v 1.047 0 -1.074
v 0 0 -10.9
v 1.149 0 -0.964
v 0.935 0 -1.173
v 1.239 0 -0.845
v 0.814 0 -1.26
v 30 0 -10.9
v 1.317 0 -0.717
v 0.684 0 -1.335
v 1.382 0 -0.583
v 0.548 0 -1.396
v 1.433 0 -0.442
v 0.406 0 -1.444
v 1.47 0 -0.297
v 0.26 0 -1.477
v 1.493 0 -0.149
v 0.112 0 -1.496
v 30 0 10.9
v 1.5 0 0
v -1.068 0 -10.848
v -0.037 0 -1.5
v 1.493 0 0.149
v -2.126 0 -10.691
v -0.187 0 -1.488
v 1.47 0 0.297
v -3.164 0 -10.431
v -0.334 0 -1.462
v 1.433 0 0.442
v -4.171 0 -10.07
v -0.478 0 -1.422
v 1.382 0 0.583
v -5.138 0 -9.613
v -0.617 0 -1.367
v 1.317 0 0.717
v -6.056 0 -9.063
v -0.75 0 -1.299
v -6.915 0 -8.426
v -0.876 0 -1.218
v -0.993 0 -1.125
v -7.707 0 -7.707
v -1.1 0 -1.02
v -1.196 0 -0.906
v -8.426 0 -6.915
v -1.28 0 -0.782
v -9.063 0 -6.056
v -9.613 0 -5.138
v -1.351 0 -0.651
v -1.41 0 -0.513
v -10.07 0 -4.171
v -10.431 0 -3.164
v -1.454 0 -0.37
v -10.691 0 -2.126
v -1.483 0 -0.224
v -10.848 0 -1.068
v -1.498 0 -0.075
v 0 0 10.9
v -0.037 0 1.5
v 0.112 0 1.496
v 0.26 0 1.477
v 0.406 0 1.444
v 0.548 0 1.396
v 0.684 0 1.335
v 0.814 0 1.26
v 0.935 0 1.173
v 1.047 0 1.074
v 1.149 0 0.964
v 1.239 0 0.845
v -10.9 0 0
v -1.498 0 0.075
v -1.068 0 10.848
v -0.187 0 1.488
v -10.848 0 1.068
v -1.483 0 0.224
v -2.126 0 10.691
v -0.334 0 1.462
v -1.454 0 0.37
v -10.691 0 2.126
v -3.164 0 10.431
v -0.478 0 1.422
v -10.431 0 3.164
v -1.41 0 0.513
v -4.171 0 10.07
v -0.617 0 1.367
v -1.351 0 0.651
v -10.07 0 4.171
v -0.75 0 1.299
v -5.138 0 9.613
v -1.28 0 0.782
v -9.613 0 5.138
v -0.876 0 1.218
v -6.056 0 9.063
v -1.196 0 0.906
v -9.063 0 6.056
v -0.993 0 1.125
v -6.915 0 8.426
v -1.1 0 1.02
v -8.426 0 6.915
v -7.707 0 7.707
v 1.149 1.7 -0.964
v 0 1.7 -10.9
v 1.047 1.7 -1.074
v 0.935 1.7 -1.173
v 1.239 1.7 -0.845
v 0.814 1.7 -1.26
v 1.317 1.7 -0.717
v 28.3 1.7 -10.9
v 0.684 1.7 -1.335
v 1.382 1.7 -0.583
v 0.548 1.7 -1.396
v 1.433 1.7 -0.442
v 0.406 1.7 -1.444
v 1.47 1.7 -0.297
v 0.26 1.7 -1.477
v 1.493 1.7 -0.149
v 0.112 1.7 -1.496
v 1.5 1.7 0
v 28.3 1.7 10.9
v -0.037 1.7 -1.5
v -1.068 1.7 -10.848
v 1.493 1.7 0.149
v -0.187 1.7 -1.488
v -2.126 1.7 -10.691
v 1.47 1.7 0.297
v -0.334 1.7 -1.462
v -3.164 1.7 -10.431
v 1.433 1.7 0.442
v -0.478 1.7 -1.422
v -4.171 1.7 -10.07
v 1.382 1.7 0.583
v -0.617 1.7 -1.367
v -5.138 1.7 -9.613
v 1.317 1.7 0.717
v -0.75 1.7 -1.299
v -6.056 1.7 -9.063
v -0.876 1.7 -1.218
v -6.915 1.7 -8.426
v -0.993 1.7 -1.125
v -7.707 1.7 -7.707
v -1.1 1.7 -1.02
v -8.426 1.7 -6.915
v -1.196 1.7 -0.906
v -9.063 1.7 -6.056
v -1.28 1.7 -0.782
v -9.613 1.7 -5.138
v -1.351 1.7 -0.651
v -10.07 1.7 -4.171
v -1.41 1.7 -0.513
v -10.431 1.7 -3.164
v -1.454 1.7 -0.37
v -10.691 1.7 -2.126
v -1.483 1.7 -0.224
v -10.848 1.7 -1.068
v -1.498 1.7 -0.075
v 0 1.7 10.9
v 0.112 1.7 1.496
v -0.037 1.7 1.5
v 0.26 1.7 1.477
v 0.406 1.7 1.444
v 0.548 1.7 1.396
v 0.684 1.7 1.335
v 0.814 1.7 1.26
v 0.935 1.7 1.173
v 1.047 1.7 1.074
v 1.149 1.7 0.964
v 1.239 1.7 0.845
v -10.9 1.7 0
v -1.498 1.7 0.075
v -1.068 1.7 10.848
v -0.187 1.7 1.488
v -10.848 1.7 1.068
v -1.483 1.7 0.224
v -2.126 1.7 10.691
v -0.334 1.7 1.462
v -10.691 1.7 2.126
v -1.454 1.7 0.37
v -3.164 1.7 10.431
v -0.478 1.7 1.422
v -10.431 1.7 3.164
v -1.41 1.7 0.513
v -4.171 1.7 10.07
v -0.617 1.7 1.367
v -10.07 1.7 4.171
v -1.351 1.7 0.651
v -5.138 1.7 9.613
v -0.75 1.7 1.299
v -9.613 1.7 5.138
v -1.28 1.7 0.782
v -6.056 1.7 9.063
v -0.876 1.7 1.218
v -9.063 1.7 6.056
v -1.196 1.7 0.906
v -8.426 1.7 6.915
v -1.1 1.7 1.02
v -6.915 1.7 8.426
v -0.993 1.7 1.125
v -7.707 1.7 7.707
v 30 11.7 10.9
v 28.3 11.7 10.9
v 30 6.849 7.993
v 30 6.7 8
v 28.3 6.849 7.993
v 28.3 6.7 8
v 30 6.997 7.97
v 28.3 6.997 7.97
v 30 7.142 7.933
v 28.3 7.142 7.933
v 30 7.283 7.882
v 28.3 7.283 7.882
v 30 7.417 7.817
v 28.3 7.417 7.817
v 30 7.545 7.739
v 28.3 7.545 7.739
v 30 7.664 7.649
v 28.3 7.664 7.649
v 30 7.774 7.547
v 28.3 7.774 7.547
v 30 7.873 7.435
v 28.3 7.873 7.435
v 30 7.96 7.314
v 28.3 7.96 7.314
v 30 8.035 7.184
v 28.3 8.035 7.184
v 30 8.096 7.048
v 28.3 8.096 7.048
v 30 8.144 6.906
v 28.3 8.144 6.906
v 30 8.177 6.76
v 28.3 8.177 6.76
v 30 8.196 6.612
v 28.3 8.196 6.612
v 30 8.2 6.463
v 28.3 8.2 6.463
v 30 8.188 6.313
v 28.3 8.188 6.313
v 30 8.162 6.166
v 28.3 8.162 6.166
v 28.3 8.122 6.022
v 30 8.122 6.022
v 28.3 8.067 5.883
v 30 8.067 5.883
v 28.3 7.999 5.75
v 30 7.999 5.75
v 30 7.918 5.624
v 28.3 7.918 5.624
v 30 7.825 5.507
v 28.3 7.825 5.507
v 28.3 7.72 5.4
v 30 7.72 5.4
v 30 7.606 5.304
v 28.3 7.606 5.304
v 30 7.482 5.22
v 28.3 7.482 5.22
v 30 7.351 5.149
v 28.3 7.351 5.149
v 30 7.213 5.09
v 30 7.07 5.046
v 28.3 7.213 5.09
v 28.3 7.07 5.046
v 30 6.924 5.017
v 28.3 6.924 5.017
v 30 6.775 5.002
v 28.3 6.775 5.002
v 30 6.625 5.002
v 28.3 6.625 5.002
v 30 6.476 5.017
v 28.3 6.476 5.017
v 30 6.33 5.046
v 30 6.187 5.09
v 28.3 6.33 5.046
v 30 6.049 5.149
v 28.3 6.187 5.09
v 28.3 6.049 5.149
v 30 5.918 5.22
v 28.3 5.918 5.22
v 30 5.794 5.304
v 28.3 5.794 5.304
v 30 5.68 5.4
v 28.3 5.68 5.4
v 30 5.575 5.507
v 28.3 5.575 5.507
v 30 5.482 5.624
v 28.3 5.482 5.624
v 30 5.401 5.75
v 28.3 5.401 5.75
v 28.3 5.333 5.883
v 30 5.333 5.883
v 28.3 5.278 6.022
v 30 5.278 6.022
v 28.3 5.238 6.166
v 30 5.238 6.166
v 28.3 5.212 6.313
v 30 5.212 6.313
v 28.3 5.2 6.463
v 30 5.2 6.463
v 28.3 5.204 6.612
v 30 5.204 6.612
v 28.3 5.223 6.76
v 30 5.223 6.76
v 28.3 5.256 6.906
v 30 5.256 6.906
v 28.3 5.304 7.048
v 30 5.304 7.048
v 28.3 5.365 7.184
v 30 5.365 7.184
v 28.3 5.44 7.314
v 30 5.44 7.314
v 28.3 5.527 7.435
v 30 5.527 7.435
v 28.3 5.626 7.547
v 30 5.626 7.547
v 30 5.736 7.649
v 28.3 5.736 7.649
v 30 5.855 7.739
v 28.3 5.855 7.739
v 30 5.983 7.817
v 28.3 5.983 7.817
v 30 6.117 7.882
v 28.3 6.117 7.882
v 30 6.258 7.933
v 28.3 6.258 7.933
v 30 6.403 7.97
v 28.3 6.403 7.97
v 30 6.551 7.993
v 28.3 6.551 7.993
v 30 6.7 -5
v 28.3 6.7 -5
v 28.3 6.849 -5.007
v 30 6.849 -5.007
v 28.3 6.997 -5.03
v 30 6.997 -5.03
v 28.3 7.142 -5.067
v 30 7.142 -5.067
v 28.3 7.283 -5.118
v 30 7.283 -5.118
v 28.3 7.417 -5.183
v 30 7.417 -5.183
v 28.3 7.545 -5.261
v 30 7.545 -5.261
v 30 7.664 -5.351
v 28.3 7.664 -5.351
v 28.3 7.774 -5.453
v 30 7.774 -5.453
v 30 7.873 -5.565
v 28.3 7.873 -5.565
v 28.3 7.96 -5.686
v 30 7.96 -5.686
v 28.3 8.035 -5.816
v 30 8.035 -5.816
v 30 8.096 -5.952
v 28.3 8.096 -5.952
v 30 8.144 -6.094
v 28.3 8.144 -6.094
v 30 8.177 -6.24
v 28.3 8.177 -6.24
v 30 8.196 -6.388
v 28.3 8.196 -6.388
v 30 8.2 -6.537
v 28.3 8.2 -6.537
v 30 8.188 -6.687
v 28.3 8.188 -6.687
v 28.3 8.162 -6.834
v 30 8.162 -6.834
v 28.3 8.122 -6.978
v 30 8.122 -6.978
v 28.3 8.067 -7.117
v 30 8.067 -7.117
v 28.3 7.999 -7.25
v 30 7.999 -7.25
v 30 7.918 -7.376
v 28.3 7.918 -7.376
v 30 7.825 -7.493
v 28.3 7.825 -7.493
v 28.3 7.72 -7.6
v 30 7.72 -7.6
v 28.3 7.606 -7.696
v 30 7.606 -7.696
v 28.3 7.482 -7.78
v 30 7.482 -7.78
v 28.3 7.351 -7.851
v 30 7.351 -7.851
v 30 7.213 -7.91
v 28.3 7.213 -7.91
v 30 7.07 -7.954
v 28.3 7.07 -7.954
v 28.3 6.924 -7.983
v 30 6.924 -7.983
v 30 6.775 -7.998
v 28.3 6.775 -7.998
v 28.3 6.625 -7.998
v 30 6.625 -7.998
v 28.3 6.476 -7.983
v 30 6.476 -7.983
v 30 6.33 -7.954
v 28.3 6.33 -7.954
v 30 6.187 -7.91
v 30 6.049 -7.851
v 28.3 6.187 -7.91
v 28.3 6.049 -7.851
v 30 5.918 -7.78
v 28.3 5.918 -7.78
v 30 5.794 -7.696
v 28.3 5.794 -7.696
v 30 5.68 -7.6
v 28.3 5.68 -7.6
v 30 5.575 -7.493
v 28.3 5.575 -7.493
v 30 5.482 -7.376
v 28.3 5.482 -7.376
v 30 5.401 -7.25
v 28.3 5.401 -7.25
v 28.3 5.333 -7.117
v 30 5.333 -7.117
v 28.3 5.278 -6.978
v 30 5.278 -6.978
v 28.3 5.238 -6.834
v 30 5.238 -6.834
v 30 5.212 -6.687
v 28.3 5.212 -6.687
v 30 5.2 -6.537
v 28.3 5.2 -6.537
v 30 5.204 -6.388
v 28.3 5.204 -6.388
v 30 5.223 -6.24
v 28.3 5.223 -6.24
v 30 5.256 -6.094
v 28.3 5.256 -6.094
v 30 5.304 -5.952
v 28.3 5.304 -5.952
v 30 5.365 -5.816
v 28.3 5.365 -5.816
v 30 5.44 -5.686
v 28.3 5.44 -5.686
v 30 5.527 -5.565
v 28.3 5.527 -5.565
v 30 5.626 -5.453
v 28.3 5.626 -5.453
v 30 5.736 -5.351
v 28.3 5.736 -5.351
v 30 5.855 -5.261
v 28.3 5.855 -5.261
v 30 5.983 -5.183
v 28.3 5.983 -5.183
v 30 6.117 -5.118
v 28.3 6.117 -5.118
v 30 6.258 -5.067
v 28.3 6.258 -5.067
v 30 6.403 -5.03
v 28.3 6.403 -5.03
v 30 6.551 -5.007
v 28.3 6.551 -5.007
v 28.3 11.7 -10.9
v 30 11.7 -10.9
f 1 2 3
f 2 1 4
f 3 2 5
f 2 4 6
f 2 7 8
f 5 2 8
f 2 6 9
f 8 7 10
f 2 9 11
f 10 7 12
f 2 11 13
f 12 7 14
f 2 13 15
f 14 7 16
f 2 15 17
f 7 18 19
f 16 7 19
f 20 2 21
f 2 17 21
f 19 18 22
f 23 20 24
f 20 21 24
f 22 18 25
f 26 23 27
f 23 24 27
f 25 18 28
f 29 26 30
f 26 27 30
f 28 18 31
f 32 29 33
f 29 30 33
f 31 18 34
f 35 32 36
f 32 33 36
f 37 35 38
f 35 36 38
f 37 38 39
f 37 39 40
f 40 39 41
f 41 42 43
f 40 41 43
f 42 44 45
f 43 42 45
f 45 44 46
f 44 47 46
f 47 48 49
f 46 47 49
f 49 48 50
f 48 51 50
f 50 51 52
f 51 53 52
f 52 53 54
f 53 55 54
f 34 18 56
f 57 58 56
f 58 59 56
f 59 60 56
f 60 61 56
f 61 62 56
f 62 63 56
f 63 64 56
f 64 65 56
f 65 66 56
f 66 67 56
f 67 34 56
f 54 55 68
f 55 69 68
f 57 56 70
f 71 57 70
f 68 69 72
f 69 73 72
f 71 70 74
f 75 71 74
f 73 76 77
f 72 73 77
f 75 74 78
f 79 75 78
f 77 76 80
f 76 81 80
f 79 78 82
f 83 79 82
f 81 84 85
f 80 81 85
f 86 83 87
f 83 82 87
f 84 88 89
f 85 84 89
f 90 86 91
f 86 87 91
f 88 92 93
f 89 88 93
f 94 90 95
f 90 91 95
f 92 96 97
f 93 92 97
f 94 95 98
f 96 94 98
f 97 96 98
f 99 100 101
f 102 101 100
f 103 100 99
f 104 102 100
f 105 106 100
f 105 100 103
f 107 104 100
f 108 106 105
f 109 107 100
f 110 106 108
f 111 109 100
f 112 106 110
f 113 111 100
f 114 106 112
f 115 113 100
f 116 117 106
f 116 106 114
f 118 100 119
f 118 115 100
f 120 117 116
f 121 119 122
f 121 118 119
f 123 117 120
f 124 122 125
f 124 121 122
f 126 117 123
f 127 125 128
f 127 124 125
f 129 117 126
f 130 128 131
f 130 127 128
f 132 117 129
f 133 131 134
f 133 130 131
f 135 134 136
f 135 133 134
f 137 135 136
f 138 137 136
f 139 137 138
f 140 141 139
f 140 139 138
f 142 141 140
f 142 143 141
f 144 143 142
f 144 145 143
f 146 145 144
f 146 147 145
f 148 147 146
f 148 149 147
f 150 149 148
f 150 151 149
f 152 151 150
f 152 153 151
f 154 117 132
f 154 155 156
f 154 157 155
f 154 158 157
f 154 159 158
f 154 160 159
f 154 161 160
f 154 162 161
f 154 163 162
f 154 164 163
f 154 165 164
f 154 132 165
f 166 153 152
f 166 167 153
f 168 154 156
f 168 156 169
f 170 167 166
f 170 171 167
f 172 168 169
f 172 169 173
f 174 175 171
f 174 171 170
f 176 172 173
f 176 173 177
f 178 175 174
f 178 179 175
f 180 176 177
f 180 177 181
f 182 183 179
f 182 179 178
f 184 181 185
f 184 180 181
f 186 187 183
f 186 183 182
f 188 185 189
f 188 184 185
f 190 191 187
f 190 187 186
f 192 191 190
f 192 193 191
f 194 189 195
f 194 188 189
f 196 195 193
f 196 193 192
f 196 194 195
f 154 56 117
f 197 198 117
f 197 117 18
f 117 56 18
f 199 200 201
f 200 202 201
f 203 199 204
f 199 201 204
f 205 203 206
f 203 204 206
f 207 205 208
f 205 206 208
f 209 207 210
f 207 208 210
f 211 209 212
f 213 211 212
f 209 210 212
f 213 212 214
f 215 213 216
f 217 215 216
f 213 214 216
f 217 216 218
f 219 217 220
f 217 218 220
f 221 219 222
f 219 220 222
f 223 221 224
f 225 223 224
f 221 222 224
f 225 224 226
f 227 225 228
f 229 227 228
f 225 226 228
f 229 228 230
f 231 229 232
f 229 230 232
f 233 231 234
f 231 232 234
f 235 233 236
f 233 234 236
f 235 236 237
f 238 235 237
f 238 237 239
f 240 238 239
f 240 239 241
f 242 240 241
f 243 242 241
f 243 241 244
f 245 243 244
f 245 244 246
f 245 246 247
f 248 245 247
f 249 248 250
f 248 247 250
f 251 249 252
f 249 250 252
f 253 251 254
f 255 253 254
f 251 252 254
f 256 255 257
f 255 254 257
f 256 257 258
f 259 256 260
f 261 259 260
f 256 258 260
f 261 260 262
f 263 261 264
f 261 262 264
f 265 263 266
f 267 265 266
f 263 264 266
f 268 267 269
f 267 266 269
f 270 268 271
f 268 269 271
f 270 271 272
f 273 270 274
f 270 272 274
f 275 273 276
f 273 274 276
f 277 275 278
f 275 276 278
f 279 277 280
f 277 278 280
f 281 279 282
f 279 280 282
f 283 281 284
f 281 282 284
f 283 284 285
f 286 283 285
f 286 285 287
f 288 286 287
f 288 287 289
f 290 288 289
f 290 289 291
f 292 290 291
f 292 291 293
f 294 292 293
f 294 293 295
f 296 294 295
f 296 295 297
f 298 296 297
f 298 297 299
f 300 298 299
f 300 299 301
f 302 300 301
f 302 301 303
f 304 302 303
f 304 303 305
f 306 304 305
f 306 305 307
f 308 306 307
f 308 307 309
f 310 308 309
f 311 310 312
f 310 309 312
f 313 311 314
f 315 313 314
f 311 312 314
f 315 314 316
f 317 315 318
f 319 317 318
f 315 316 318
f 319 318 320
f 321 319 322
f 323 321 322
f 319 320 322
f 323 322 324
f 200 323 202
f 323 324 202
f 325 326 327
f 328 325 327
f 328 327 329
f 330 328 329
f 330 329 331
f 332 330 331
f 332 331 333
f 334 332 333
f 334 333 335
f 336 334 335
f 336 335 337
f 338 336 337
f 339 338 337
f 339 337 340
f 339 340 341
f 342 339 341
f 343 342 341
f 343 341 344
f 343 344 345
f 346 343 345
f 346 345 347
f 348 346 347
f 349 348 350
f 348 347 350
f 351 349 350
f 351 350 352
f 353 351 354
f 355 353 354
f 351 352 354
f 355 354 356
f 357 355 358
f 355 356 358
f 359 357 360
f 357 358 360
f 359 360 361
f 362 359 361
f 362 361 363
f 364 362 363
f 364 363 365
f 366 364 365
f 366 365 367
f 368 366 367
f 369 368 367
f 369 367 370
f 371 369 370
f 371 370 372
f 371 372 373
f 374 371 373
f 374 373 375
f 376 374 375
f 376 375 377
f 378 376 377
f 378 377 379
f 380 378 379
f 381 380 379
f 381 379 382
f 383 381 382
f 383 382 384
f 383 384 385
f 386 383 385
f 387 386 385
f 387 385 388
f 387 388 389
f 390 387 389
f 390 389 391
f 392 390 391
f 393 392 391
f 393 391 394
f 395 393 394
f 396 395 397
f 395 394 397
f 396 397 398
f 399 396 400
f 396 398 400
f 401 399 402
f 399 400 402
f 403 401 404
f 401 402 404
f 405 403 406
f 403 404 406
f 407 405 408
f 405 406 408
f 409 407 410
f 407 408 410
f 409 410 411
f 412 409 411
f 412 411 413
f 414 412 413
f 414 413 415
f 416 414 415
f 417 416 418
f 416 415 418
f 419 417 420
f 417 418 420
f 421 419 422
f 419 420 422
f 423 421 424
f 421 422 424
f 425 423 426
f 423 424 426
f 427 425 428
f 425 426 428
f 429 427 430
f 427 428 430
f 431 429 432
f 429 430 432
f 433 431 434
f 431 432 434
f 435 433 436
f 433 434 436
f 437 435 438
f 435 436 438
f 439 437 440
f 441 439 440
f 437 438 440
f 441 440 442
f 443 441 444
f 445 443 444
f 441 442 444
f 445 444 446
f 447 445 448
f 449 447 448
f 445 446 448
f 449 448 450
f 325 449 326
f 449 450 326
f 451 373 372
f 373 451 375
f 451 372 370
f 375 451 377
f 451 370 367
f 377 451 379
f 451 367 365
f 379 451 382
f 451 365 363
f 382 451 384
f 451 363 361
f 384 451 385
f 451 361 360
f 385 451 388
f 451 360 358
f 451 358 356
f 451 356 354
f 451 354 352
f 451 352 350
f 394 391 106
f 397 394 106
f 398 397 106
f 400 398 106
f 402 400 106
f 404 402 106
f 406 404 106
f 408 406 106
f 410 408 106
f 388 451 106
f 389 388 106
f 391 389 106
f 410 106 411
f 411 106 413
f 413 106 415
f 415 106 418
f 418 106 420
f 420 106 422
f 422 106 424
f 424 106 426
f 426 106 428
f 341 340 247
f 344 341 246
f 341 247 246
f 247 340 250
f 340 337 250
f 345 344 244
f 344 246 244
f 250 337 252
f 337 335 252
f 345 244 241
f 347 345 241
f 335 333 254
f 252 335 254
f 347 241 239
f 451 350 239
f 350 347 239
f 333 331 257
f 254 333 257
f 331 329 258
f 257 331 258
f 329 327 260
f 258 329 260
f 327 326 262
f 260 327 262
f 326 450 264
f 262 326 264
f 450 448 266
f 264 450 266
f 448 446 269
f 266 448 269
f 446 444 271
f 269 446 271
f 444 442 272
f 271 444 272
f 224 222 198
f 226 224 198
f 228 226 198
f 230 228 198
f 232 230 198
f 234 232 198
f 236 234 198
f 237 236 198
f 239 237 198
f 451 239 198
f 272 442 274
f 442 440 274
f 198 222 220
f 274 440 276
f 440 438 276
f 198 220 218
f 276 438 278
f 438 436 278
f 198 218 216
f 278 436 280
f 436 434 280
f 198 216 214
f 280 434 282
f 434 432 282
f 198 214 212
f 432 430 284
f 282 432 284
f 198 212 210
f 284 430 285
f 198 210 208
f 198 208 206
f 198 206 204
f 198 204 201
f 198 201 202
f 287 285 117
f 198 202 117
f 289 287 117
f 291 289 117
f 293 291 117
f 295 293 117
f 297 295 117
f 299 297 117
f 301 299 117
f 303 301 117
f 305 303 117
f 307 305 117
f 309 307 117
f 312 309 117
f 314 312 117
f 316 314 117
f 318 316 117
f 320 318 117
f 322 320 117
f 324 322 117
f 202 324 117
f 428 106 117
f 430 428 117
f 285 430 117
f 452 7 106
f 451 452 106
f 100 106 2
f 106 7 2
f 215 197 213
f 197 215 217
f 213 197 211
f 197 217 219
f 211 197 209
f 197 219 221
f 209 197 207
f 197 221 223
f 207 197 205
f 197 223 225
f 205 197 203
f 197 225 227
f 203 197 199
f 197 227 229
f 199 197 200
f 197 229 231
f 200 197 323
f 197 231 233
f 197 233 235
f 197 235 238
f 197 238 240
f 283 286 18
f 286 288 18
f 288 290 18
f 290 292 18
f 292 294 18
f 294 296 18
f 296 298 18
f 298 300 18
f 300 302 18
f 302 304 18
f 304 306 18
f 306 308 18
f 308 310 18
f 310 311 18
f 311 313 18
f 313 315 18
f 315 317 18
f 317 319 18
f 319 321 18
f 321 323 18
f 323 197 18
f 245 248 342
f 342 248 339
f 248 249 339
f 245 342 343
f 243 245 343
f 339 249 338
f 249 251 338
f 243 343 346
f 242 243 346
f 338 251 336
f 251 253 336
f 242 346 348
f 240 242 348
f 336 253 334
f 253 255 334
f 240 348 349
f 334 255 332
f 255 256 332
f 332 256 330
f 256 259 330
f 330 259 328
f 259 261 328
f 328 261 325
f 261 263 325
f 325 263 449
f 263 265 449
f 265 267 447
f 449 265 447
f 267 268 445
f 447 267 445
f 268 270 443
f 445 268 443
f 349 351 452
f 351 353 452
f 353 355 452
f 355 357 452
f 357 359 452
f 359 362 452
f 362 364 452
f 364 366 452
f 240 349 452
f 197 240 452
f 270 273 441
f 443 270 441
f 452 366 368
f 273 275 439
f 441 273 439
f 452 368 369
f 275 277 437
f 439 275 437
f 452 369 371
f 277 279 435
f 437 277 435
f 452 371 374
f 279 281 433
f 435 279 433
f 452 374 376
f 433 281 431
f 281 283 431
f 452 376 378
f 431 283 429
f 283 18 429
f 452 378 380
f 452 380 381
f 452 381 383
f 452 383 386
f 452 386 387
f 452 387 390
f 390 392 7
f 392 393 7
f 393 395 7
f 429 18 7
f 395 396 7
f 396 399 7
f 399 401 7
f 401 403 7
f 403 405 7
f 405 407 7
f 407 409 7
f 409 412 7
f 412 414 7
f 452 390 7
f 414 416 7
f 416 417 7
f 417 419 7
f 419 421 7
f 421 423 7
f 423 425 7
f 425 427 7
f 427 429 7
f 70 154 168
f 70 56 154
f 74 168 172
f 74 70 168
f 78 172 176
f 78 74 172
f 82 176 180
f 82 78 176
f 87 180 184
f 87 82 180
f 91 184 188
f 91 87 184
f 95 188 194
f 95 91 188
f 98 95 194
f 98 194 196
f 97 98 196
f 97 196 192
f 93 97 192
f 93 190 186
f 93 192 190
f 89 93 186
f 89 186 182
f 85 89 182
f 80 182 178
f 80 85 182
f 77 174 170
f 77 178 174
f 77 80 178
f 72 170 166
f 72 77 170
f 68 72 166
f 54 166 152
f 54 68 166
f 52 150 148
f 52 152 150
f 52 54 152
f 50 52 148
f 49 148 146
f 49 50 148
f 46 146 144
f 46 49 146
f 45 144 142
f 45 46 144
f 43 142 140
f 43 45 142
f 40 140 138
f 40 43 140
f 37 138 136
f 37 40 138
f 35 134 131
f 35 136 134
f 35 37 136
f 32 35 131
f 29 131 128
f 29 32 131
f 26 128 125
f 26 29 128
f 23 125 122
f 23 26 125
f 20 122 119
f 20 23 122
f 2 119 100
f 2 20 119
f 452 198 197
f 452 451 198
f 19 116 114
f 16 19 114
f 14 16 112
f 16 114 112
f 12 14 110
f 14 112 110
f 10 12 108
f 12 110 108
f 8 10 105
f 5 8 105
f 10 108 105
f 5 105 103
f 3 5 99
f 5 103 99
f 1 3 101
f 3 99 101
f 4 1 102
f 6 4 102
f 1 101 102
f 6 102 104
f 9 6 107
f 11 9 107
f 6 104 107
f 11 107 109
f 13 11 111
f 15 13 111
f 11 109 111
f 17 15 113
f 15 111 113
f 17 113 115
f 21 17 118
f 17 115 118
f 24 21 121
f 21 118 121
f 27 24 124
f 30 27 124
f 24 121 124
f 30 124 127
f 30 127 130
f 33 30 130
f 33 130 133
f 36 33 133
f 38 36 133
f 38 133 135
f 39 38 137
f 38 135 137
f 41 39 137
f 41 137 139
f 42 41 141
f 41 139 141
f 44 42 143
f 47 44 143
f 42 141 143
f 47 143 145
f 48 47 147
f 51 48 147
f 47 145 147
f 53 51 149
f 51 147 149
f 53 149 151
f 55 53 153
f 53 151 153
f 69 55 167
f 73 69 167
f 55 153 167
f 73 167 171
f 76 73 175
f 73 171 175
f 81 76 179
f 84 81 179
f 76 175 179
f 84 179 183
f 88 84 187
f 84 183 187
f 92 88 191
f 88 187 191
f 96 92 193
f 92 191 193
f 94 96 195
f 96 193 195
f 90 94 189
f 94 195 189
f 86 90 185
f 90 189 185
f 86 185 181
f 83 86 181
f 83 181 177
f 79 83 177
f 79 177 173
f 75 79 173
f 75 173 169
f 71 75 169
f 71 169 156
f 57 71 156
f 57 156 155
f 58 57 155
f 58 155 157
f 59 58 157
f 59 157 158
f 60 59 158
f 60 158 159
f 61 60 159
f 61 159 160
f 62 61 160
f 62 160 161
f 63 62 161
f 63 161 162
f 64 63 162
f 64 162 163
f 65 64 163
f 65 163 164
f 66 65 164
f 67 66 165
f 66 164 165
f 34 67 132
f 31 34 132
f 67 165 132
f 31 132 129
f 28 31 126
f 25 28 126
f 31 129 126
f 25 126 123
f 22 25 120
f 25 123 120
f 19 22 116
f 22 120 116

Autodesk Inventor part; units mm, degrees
ref_plane "YZ Plane" through (0, 0, 0) normal (1, 0, 0) x (0, 1, 0)
ref_plane "XZ Plane" through (0, 0, 0) normal (0, 1, 0) x (-1, 0, 0)
ref_plane "XY Plane" through (0, 0, 0) normal (0, 0, 1) x (1, 0, 0)
sketch "Sketch1" plane through (0, 0, 0) normal (0, 1, 0) x (-1, 0, 0)
  arc A0 (0, -10.9) -> (0, 10.9) centre (0, 0) ccw
  line L0 (0, -10.9) -> (-30, -10.9)
  line L1 (-30, -10.9) -> (-30, 10.9)
  line L2 (-30, 10.9) -> (0, 10.9)
  line L3 (0, 10.9) -> (0, -10.9) construction
  dimension "d2" = 10.9
  dimension "d3" = 30
  dimension "d4" = 30
  dimension "d5" = 21.8
extrude "Extrusion1" add sketch "Sketch1" along normal blind 1.7
sketch "Sketch2" plane through (0, 1.7, 0) normal (0, 1, 0) x (1, 0, 0)
  arc A0 (0, 10.9) -> (0, -10.9) centre (0, 0) ccw projected
  circle A1 centre (0, 0) radius 1.5
  dimension "d8" = 3
extrude "Extrusion2" cut sketch "Sketch2" against normal blind 1.7
sketch "Sketch3" plane through (0, 1.7, 0) normal (0, 1, 0) x (1, 0, 0)
  line L0 (30, 10.9) -> (0, 10.9) projected
  line L1 (0, -10.9) -> (30, -10.9) projected
  line L2 (30, 10.9) -> (28.3, 10.9)
  line L3 (28.3, 10.9) -> (28.3, -10.9)
  line L4 (28.3, -10.9) -> (30, -10.9)
  line L5 (30, -10.9) -> (30, 10.9)
  point P0 (0, 0)
  dimension "d11" = 1.7
extrude "Extrusion3" add sketch "Sketch3" along normal blind 10
sketch "Sketch4" plane through (28.3, 1.7, -10.9) normal (-1, 0, 0) x (0, 0, 1)
  circle A0 centre (4.4, 5) radius 1.5
  circle A1 centre (17.4, 5) radius 1.5
  line L0 (0, 10) -> (21.8, 10) projected
  line L1 (21.8, 0) -> (21.8, 10) projected
  point P0 (10.9, -1.7)
  dimension "d14" = 3
  dimension "d15" = 3
  dimension "d16" = 13
  dimension "d17" = 0
  dimension "d18" = 5
  dimension "d19" = 4.4
extrude "Extrusion4" cut sketch "Sketch4" against normal blind 10
equation "\"BendRadius\" = Thickness"
equation "\"BendReliefWidth\" = Thickness"
equation "\"BendReliefDepth\" = 0.5 * Thickness"
equation "\"CornerReliefSize\" = 4 * Thickness"
equation "\"MinimumRemnant\" = 2 * Thickness"
equation "\"TransitionRadius\" = BendRadius"
equation "\"JacobiRadiusSize\" = BendRadius"
equation "\"GapSize\" = Thickness"
equation "\"Thickness\" = 3.048"
properties part number "A3P3"
